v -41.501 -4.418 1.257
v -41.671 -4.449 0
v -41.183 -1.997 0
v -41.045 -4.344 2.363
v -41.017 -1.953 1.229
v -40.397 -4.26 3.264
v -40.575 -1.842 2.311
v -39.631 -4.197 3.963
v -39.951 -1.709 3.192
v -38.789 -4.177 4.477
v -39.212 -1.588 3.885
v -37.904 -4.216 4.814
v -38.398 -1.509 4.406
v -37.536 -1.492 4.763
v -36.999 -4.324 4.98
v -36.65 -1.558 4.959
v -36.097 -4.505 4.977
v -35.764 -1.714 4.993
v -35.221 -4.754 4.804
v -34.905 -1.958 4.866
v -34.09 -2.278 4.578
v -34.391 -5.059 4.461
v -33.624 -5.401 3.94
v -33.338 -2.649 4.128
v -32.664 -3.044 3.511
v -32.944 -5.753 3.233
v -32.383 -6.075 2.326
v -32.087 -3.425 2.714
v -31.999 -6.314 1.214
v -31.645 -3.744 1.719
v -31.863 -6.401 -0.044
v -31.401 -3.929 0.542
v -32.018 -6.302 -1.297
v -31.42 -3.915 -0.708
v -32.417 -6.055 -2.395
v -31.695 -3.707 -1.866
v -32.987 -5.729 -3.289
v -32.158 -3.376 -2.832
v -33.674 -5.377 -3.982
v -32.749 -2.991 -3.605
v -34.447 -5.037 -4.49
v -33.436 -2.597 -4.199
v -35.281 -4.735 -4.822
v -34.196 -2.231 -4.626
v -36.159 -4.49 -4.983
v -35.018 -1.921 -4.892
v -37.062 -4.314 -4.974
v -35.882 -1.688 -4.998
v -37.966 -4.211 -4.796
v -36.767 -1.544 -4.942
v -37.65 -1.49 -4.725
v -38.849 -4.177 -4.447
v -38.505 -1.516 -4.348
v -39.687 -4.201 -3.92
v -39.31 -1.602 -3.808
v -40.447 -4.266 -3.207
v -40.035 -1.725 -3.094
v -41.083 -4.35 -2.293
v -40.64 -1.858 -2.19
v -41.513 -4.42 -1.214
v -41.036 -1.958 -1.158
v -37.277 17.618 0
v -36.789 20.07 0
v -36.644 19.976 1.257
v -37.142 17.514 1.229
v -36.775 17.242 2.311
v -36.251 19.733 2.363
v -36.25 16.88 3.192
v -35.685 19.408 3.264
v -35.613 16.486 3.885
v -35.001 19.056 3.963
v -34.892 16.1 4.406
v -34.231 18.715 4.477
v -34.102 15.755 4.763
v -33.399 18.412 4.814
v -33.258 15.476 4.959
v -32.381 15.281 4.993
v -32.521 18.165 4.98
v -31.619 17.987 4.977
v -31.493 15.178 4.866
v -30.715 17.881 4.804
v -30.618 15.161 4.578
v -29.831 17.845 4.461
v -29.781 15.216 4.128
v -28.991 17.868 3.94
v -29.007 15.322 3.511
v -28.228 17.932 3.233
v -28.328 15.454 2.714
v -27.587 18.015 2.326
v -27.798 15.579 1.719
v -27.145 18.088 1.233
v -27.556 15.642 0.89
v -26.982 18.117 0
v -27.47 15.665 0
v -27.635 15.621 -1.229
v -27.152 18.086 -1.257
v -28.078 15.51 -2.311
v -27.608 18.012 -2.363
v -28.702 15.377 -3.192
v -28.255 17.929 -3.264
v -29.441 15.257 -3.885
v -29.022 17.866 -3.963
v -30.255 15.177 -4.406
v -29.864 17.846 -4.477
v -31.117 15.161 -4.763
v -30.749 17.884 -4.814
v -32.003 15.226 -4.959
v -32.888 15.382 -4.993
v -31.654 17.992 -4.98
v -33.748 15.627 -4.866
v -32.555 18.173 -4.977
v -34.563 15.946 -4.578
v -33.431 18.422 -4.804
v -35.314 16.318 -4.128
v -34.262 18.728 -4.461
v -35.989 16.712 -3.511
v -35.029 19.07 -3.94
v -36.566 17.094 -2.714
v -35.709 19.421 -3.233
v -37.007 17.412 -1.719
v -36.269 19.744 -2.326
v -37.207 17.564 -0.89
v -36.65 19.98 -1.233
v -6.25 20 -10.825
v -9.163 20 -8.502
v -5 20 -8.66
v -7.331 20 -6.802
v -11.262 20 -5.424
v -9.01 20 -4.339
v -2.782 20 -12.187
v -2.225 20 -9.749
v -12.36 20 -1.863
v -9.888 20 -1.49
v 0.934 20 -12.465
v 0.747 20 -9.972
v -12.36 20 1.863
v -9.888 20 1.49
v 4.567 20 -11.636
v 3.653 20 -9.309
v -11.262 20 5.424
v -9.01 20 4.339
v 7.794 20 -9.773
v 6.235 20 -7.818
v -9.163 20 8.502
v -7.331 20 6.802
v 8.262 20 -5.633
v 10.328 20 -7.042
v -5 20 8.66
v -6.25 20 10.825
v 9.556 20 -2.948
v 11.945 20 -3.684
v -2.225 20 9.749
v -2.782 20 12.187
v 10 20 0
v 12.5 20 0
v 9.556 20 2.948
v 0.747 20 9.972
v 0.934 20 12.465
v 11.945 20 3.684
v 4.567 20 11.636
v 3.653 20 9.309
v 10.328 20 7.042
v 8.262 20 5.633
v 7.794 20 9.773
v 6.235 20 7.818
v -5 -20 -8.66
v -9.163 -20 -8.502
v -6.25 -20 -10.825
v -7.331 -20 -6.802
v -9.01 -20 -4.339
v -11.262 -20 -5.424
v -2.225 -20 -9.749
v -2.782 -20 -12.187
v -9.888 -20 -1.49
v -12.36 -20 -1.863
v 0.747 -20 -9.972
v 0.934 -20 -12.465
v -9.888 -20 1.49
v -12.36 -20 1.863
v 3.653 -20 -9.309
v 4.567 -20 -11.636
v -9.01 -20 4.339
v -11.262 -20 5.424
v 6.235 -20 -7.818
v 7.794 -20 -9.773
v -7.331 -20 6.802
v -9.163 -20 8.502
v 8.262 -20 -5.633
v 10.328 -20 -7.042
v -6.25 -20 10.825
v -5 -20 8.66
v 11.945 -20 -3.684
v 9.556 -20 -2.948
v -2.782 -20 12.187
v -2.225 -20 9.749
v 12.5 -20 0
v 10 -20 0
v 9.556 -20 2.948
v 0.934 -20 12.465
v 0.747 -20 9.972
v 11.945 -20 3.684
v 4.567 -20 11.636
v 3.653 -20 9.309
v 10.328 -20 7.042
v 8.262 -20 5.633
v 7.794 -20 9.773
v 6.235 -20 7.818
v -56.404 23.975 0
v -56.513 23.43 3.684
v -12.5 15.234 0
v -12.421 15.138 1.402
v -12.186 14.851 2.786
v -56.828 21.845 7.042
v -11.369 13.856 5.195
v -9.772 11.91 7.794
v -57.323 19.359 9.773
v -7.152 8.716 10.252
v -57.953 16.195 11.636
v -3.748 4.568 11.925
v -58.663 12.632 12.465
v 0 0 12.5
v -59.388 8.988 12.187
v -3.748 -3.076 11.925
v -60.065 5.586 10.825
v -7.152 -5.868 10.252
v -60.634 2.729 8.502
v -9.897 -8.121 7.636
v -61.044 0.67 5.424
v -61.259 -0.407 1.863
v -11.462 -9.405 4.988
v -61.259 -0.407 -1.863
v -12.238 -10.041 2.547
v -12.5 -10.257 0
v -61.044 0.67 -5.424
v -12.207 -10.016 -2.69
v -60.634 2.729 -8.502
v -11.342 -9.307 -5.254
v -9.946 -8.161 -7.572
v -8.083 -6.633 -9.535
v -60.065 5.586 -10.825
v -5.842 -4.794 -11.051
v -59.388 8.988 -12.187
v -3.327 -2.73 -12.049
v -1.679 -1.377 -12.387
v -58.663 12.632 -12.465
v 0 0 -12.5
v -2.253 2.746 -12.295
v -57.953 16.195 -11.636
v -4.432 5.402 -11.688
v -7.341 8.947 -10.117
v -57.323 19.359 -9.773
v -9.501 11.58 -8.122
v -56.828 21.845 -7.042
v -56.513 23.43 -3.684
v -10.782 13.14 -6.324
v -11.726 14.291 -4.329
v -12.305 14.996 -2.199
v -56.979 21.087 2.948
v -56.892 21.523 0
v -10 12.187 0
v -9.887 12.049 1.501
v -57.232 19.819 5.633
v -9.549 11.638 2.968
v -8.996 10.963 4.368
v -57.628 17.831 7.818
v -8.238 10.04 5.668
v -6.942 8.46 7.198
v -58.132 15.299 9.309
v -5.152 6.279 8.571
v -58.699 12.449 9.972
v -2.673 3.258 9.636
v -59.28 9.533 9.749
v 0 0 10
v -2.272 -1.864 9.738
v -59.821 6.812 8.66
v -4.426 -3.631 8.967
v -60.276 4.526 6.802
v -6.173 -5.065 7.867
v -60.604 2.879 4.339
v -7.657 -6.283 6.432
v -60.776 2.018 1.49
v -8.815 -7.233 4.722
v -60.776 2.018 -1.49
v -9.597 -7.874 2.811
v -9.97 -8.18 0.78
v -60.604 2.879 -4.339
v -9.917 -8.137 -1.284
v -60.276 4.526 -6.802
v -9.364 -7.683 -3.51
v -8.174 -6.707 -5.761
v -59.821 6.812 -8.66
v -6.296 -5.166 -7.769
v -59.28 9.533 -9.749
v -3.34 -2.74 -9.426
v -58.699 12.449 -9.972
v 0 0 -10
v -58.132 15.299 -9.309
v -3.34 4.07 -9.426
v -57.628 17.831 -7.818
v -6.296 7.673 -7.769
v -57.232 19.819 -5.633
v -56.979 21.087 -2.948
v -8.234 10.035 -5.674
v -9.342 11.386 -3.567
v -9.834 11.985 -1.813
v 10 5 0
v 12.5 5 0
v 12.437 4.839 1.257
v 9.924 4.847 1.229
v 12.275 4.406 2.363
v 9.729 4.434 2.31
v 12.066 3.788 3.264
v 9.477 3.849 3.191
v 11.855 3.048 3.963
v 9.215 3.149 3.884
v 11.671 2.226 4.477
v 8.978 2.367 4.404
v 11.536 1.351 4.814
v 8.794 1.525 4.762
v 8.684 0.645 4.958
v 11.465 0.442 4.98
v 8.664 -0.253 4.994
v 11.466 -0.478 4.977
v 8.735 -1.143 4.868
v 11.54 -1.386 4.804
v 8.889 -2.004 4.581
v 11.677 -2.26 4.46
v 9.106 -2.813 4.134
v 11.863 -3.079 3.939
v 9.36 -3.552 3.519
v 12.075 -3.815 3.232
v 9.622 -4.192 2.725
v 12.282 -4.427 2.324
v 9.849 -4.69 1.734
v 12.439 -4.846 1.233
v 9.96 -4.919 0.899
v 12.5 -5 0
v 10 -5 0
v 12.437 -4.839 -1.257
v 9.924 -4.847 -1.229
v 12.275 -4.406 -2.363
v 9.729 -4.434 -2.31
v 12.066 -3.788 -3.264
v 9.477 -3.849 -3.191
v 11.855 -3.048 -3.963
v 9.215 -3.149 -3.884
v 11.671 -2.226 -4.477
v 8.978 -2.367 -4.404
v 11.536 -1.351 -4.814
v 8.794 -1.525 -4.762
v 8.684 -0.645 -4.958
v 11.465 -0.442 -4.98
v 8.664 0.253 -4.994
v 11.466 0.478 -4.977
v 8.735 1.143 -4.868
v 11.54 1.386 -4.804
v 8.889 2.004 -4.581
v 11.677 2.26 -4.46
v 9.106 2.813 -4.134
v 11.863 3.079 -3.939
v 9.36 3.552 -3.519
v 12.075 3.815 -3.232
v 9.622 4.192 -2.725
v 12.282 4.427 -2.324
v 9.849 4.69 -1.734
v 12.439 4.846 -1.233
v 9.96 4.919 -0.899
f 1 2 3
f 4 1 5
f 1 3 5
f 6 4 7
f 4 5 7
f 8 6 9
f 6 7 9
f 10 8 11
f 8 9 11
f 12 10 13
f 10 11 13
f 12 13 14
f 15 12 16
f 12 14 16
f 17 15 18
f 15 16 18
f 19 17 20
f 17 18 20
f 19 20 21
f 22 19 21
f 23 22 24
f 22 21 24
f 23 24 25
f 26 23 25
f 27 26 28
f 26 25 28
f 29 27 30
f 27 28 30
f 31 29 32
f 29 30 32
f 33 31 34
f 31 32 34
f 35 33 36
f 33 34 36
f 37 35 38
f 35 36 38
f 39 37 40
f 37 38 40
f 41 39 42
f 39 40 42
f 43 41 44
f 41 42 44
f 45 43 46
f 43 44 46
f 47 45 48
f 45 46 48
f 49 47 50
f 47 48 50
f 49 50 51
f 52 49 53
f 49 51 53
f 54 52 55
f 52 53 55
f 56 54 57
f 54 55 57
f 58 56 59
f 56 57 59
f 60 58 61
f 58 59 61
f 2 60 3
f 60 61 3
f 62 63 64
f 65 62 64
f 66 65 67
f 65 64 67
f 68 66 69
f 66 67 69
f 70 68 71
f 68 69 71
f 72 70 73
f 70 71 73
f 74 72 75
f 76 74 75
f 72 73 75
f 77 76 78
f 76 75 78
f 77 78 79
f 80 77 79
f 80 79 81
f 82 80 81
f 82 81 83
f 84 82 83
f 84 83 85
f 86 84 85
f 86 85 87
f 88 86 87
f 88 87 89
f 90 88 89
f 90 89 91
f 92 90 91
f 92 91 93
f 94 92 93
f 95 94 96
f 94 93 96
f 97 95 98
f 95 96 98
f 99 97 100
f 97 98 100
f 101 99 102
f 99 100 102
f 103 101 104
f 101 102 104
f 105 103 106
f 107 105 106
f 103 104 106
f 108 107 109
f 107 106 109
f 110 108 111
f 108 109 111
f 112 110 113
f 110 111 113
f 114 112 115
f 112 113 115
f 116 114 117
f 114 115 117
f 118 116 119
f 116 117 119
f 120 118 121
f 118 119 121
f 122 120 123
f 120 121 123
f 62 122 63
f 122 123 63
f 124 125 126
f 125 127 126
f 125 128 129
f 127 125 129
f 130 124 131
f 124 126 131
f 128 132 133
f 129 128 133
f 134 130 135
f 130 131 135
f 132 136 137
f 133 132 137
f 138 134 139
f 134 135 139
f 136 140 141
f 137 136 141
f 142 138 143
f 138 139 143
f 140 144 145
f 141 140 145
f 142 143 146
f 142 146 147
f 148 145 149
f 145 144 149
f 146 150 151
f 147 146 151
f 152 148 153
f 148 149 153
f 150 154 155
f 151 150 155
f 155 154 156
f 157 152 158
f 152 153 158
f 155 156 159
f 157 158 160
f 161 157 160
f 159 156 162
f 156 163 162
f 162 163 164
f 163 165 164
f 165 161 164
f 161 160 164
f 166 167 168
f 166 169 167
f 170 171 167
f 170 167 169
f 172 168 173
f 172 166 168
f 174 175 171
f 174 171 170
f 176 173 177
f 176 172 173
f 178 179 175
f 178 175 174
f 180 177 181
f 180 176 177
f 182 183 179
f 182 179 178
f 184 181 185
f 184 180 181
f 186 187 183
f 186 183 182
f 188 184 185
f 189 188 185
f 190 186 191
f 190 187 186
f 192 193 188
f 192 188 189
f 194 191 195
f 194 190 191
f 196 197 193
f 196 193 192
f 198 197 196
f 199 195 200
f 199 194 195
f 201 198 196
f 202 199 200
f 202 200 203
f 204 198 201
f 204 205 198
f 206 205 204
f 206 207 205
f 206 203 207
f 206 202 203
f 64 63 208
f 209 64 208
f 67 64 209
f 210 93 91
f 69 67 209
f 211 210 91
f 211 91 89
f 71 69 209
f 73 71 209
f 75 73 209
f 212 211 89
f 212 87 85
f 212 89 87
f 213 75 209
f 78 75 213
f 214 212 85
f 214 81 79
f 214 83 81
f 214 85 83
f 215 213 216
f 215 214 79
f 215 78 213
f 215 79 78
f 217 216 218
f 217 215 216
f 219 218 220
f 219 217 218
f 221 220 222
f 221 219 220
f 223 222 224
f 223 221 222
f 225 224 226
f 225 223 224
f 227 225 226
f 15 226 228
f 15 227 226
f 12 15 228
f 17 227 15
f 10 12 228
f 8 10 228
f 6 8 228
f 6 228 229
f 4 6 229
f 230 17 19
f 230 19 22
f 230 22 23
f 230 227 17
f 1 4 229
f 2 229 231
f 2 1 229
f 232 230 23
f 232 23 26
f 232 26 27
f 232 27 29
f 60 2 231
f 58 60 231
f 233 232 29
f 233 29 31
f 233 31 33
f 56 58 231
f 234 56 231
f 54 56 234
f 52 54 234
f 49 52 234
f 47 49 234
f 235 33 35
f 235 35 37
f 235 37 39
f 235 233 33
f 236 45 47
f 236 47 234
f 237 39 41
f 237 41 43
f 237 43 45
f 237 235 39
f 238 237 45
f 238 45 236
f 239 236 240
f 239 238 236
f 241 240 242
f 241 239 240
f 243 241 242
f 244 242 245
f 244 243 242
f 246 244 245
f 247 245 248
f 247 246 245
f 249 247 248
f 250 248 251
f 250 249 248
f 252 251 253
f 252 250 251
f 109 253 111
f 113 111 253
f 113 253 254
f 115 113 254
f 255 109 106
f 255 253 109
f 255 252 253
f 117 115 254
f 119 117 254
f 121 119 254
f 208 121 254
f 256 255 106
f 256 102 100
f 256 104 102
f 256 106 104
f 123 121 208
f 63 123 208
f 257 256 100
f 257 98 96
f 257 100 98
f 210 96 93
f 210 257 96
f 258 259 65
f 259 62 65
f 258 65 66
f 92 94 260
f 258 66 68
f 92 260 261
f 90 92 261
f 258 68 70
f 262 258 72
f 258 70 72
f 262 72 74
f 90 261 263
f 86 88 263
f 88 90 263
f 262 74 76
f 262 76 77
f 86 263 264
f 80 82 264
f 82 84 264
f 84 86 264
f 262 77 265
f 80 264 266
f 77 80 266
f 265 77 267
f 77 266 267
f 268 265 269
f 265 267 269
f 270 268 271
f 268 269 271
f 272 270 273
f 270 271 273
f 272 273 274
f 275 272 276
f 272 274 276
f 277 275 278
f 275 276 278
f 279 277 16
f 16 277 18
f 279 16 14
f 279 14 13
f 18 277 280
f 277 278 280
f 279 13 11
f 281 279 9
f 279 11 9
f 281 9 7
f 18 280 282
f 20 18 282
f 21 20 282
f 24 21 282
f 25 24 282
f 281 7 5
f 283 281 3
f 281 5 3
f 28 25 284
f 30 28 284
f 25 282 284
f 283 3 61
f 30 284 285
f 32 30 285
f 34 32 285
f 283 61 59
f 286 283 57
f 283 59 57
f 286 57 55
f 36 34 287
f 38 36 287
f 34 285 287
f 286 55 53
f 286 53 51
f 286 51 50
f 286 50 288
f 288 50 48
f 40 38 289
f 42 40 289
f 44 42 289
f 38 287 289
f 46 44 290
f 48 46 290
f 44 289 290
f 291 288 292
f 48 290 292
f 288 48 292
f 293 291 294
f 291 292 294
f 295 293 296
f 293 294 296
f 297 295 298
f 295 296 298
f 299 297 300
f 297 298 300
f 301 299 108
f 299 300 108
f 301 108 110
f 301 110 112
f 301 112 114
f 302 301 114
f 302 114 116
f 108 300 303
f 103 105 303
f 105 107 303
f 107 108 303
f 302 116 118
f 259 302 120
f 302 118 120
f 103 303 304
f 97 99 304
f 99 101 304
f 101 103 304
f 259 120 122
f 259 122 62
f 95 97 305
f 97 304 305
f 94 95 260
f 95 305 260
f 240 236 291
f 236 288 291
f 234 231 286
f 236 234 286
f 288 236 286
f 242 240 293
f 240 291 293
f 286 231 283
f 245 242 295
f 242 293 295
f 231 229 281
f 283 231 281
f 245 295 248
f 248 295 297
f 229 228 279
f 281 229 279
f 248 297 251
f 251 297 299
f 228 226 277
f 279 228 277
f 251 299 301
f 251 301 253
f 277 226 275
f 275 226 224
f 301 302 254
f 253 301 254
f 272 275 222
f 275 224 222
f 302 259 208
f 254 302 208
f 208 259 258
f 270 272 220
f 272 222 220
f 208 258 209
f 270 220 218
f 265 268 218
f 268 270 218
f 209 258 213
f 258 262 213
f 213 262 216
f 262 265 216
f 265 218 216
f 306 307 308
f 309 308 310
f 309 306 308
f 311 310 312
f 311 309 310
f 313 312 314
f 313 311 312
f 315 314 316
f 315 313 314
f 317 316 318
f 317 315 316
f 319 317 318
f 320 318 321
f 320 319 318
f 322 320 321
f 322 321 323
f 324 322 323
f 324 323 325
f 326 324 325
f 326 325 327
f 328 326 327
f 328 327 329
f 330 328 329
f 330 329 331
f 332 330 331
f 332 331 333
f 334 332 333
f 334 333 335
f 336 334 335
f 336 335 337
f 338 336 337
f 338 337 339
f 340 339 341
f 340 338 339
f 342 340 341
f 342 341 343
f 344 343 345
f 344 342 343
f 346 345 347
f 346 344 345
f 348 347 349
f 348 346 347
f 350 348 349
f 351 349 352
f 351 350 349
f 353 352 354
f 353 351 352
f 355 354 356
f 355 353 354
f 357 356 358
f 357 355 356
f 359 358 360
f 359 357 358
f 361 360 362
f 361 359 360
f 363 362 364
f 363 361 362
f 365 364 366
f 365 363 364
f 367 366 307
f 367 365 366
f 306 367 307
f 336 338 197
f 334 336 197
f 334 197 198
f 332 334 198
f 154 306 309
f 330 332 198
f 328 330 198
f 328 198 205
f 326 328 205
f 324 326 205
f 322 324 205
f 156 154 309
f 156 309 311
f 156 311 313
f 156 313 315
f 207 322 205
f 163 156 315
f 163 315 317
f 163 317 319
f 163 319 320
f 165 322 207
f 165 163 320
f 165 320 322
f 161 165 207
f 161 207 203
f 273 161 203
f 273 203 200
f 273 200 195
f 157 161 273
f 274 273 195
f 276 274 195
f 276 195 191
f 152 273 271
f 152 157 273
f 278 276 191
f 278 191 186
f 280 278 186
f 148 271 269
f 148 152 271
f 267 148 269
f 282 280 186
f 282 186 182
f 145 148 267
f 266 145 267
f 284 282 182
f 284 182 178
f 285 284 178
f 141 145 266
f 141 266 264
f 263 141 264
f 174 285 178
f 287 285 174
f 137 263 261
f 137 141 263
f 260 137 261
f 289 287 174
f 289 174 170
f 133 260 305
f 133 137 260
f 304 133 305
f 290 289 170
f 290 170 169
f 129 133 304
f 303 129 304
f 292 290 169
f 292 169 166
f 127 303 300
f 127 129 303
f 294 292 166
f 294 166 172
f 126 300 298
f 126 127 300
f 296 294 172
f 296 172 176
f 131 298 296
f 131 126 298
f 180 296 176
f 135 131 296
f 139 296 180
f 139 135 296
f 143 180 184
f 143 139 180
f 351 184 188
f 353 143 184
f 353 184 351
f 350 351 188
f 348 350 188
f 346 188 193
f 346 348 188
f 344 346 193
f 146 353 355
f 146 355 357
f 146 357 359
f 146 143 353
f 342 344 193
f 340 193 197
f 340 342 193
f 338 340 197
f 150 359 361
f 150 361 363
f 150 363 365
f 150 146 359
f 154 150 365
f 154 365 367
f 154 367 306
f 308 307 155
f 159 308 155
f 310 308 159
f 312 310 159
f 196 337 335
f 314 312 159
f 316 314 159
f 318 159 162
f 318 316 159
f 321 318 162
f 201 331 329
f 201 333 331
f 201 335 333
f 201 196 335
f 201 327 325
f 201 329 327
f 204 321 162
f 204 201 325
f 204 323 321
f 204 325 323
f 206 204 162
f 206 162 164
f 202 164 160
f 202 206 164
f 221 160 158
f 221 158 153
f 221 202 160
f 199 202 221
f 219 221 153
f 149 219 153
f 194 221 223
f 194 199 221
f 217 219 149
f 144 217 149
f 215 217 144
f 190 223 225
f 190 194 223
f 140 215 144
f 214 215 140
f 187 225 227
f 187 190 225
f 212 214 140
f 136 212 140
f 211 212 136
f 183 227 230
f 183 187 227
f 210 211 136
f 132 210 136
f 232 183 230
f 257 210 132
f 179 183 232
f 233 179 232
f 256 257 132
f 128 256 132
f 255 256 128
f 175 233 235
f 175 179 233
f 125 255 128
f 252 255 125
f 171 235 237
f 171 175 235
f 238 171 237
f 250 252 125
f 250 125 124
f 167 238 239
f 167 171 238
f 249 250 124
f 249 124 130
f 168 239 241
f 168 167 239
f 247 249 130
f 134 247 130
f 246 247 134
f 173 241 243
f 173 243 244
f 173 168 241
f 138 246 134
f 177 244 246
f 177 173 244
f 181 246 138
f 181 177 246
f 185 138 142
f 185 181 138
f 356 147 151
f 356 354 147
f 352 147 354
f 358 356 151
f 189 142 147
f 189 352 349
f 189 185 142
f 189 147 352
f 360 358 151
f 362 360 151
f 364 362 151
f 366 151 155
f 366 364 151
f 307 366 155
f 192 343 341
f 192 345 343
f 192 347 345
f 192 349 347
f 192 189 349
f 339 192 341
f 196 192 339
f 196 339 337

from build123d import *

# Parameters (mm, degrees)
F0_R      = 12.5
F0_R_2    = 10
F1_DEPTH  = 20
F4_R      = 12.5
F4_R_2    = 10
F5_DEPTH  = 50
F6_R      = 10
F7_DEPTH  = 25
F8_R      = 10
F9_DEPTH  = 25
F10_R     = 5
F11_DEPTH = 25
F13_R     = 5
F14_DEPTH = 15
F15_DEPTH = 10


with BuildPart() as f1:
    # F0 (on Front) → F1 (new body, symmetric)
    with BuildSketch(Plane.XZ):
        Circle(F0_R)
        Circle(F0_R_2, mode=Mode.SUBTRACT)
    extrude(amount=F1_DEPTH, both=True)

    # F4 (on line) → F5 (join)
    with BuildSketch(Plane(origin=(0, 0, 0), x_dir=(0.1952614984, 0.9807512158, 0), z_dir=(0.9807512158, -0.1952614984, 0))):
        Circle(F4_R)
        Circle(F4_R_2, mode=Mode.SUBTRACT)
    extrude(amount=-F5_DEPTH)

    # F6 (on Front) → F7 (cut, symmetric)
    with BuildSketch(Plane.XZ):
        Circle(F6_R)
    extrude(amount=F7_DEPTH, both=True, mode=Mode.SUBTRACT)

    # F8 (on line) → F9 (cut)
    with BuildSketch(Plane(origin=(0, 0, 0), x_dir=(0.1952614984, 0.9807512158, 0), z_dir=(0.9807512158, -0.1952614984, 0))):
        Circle(F8_R)
    extrude(amount=-F9_DEPTH, mode=Mode.SUBTRACT)

    # F10 (on Right) → F11 (cut)
    with BuildSketch(Plane.YZ):
        Circle(F10_R)
    extrude(amount=F11_DEPTH, mode=Mode.SUBTRACT)

    # F13 (on face) → F14 (cut, symmetric)
    with BuildSketch(Plane(origin=(0, 0, 0), x_dir=(-0.9807512158, 0.1952614984, 0), z_dir=(0.1952614984, 0.9807512158, 0))):
        with Locations((35, 0)):
            Circle(F13_R)
    extrude(amount=F14_DEPTH, both=True, mode=Mode.SUBTRACT)

    # F15 (add): a face of the model
    f15_faces = [f1.faces().sort_by_distance(p)[0] for p in [
        (-51.4092941538, -2.1495673612, 0),
    ]]
    extrude(f15_faces, amount=F15_DEPTH)


solid = f1.part
